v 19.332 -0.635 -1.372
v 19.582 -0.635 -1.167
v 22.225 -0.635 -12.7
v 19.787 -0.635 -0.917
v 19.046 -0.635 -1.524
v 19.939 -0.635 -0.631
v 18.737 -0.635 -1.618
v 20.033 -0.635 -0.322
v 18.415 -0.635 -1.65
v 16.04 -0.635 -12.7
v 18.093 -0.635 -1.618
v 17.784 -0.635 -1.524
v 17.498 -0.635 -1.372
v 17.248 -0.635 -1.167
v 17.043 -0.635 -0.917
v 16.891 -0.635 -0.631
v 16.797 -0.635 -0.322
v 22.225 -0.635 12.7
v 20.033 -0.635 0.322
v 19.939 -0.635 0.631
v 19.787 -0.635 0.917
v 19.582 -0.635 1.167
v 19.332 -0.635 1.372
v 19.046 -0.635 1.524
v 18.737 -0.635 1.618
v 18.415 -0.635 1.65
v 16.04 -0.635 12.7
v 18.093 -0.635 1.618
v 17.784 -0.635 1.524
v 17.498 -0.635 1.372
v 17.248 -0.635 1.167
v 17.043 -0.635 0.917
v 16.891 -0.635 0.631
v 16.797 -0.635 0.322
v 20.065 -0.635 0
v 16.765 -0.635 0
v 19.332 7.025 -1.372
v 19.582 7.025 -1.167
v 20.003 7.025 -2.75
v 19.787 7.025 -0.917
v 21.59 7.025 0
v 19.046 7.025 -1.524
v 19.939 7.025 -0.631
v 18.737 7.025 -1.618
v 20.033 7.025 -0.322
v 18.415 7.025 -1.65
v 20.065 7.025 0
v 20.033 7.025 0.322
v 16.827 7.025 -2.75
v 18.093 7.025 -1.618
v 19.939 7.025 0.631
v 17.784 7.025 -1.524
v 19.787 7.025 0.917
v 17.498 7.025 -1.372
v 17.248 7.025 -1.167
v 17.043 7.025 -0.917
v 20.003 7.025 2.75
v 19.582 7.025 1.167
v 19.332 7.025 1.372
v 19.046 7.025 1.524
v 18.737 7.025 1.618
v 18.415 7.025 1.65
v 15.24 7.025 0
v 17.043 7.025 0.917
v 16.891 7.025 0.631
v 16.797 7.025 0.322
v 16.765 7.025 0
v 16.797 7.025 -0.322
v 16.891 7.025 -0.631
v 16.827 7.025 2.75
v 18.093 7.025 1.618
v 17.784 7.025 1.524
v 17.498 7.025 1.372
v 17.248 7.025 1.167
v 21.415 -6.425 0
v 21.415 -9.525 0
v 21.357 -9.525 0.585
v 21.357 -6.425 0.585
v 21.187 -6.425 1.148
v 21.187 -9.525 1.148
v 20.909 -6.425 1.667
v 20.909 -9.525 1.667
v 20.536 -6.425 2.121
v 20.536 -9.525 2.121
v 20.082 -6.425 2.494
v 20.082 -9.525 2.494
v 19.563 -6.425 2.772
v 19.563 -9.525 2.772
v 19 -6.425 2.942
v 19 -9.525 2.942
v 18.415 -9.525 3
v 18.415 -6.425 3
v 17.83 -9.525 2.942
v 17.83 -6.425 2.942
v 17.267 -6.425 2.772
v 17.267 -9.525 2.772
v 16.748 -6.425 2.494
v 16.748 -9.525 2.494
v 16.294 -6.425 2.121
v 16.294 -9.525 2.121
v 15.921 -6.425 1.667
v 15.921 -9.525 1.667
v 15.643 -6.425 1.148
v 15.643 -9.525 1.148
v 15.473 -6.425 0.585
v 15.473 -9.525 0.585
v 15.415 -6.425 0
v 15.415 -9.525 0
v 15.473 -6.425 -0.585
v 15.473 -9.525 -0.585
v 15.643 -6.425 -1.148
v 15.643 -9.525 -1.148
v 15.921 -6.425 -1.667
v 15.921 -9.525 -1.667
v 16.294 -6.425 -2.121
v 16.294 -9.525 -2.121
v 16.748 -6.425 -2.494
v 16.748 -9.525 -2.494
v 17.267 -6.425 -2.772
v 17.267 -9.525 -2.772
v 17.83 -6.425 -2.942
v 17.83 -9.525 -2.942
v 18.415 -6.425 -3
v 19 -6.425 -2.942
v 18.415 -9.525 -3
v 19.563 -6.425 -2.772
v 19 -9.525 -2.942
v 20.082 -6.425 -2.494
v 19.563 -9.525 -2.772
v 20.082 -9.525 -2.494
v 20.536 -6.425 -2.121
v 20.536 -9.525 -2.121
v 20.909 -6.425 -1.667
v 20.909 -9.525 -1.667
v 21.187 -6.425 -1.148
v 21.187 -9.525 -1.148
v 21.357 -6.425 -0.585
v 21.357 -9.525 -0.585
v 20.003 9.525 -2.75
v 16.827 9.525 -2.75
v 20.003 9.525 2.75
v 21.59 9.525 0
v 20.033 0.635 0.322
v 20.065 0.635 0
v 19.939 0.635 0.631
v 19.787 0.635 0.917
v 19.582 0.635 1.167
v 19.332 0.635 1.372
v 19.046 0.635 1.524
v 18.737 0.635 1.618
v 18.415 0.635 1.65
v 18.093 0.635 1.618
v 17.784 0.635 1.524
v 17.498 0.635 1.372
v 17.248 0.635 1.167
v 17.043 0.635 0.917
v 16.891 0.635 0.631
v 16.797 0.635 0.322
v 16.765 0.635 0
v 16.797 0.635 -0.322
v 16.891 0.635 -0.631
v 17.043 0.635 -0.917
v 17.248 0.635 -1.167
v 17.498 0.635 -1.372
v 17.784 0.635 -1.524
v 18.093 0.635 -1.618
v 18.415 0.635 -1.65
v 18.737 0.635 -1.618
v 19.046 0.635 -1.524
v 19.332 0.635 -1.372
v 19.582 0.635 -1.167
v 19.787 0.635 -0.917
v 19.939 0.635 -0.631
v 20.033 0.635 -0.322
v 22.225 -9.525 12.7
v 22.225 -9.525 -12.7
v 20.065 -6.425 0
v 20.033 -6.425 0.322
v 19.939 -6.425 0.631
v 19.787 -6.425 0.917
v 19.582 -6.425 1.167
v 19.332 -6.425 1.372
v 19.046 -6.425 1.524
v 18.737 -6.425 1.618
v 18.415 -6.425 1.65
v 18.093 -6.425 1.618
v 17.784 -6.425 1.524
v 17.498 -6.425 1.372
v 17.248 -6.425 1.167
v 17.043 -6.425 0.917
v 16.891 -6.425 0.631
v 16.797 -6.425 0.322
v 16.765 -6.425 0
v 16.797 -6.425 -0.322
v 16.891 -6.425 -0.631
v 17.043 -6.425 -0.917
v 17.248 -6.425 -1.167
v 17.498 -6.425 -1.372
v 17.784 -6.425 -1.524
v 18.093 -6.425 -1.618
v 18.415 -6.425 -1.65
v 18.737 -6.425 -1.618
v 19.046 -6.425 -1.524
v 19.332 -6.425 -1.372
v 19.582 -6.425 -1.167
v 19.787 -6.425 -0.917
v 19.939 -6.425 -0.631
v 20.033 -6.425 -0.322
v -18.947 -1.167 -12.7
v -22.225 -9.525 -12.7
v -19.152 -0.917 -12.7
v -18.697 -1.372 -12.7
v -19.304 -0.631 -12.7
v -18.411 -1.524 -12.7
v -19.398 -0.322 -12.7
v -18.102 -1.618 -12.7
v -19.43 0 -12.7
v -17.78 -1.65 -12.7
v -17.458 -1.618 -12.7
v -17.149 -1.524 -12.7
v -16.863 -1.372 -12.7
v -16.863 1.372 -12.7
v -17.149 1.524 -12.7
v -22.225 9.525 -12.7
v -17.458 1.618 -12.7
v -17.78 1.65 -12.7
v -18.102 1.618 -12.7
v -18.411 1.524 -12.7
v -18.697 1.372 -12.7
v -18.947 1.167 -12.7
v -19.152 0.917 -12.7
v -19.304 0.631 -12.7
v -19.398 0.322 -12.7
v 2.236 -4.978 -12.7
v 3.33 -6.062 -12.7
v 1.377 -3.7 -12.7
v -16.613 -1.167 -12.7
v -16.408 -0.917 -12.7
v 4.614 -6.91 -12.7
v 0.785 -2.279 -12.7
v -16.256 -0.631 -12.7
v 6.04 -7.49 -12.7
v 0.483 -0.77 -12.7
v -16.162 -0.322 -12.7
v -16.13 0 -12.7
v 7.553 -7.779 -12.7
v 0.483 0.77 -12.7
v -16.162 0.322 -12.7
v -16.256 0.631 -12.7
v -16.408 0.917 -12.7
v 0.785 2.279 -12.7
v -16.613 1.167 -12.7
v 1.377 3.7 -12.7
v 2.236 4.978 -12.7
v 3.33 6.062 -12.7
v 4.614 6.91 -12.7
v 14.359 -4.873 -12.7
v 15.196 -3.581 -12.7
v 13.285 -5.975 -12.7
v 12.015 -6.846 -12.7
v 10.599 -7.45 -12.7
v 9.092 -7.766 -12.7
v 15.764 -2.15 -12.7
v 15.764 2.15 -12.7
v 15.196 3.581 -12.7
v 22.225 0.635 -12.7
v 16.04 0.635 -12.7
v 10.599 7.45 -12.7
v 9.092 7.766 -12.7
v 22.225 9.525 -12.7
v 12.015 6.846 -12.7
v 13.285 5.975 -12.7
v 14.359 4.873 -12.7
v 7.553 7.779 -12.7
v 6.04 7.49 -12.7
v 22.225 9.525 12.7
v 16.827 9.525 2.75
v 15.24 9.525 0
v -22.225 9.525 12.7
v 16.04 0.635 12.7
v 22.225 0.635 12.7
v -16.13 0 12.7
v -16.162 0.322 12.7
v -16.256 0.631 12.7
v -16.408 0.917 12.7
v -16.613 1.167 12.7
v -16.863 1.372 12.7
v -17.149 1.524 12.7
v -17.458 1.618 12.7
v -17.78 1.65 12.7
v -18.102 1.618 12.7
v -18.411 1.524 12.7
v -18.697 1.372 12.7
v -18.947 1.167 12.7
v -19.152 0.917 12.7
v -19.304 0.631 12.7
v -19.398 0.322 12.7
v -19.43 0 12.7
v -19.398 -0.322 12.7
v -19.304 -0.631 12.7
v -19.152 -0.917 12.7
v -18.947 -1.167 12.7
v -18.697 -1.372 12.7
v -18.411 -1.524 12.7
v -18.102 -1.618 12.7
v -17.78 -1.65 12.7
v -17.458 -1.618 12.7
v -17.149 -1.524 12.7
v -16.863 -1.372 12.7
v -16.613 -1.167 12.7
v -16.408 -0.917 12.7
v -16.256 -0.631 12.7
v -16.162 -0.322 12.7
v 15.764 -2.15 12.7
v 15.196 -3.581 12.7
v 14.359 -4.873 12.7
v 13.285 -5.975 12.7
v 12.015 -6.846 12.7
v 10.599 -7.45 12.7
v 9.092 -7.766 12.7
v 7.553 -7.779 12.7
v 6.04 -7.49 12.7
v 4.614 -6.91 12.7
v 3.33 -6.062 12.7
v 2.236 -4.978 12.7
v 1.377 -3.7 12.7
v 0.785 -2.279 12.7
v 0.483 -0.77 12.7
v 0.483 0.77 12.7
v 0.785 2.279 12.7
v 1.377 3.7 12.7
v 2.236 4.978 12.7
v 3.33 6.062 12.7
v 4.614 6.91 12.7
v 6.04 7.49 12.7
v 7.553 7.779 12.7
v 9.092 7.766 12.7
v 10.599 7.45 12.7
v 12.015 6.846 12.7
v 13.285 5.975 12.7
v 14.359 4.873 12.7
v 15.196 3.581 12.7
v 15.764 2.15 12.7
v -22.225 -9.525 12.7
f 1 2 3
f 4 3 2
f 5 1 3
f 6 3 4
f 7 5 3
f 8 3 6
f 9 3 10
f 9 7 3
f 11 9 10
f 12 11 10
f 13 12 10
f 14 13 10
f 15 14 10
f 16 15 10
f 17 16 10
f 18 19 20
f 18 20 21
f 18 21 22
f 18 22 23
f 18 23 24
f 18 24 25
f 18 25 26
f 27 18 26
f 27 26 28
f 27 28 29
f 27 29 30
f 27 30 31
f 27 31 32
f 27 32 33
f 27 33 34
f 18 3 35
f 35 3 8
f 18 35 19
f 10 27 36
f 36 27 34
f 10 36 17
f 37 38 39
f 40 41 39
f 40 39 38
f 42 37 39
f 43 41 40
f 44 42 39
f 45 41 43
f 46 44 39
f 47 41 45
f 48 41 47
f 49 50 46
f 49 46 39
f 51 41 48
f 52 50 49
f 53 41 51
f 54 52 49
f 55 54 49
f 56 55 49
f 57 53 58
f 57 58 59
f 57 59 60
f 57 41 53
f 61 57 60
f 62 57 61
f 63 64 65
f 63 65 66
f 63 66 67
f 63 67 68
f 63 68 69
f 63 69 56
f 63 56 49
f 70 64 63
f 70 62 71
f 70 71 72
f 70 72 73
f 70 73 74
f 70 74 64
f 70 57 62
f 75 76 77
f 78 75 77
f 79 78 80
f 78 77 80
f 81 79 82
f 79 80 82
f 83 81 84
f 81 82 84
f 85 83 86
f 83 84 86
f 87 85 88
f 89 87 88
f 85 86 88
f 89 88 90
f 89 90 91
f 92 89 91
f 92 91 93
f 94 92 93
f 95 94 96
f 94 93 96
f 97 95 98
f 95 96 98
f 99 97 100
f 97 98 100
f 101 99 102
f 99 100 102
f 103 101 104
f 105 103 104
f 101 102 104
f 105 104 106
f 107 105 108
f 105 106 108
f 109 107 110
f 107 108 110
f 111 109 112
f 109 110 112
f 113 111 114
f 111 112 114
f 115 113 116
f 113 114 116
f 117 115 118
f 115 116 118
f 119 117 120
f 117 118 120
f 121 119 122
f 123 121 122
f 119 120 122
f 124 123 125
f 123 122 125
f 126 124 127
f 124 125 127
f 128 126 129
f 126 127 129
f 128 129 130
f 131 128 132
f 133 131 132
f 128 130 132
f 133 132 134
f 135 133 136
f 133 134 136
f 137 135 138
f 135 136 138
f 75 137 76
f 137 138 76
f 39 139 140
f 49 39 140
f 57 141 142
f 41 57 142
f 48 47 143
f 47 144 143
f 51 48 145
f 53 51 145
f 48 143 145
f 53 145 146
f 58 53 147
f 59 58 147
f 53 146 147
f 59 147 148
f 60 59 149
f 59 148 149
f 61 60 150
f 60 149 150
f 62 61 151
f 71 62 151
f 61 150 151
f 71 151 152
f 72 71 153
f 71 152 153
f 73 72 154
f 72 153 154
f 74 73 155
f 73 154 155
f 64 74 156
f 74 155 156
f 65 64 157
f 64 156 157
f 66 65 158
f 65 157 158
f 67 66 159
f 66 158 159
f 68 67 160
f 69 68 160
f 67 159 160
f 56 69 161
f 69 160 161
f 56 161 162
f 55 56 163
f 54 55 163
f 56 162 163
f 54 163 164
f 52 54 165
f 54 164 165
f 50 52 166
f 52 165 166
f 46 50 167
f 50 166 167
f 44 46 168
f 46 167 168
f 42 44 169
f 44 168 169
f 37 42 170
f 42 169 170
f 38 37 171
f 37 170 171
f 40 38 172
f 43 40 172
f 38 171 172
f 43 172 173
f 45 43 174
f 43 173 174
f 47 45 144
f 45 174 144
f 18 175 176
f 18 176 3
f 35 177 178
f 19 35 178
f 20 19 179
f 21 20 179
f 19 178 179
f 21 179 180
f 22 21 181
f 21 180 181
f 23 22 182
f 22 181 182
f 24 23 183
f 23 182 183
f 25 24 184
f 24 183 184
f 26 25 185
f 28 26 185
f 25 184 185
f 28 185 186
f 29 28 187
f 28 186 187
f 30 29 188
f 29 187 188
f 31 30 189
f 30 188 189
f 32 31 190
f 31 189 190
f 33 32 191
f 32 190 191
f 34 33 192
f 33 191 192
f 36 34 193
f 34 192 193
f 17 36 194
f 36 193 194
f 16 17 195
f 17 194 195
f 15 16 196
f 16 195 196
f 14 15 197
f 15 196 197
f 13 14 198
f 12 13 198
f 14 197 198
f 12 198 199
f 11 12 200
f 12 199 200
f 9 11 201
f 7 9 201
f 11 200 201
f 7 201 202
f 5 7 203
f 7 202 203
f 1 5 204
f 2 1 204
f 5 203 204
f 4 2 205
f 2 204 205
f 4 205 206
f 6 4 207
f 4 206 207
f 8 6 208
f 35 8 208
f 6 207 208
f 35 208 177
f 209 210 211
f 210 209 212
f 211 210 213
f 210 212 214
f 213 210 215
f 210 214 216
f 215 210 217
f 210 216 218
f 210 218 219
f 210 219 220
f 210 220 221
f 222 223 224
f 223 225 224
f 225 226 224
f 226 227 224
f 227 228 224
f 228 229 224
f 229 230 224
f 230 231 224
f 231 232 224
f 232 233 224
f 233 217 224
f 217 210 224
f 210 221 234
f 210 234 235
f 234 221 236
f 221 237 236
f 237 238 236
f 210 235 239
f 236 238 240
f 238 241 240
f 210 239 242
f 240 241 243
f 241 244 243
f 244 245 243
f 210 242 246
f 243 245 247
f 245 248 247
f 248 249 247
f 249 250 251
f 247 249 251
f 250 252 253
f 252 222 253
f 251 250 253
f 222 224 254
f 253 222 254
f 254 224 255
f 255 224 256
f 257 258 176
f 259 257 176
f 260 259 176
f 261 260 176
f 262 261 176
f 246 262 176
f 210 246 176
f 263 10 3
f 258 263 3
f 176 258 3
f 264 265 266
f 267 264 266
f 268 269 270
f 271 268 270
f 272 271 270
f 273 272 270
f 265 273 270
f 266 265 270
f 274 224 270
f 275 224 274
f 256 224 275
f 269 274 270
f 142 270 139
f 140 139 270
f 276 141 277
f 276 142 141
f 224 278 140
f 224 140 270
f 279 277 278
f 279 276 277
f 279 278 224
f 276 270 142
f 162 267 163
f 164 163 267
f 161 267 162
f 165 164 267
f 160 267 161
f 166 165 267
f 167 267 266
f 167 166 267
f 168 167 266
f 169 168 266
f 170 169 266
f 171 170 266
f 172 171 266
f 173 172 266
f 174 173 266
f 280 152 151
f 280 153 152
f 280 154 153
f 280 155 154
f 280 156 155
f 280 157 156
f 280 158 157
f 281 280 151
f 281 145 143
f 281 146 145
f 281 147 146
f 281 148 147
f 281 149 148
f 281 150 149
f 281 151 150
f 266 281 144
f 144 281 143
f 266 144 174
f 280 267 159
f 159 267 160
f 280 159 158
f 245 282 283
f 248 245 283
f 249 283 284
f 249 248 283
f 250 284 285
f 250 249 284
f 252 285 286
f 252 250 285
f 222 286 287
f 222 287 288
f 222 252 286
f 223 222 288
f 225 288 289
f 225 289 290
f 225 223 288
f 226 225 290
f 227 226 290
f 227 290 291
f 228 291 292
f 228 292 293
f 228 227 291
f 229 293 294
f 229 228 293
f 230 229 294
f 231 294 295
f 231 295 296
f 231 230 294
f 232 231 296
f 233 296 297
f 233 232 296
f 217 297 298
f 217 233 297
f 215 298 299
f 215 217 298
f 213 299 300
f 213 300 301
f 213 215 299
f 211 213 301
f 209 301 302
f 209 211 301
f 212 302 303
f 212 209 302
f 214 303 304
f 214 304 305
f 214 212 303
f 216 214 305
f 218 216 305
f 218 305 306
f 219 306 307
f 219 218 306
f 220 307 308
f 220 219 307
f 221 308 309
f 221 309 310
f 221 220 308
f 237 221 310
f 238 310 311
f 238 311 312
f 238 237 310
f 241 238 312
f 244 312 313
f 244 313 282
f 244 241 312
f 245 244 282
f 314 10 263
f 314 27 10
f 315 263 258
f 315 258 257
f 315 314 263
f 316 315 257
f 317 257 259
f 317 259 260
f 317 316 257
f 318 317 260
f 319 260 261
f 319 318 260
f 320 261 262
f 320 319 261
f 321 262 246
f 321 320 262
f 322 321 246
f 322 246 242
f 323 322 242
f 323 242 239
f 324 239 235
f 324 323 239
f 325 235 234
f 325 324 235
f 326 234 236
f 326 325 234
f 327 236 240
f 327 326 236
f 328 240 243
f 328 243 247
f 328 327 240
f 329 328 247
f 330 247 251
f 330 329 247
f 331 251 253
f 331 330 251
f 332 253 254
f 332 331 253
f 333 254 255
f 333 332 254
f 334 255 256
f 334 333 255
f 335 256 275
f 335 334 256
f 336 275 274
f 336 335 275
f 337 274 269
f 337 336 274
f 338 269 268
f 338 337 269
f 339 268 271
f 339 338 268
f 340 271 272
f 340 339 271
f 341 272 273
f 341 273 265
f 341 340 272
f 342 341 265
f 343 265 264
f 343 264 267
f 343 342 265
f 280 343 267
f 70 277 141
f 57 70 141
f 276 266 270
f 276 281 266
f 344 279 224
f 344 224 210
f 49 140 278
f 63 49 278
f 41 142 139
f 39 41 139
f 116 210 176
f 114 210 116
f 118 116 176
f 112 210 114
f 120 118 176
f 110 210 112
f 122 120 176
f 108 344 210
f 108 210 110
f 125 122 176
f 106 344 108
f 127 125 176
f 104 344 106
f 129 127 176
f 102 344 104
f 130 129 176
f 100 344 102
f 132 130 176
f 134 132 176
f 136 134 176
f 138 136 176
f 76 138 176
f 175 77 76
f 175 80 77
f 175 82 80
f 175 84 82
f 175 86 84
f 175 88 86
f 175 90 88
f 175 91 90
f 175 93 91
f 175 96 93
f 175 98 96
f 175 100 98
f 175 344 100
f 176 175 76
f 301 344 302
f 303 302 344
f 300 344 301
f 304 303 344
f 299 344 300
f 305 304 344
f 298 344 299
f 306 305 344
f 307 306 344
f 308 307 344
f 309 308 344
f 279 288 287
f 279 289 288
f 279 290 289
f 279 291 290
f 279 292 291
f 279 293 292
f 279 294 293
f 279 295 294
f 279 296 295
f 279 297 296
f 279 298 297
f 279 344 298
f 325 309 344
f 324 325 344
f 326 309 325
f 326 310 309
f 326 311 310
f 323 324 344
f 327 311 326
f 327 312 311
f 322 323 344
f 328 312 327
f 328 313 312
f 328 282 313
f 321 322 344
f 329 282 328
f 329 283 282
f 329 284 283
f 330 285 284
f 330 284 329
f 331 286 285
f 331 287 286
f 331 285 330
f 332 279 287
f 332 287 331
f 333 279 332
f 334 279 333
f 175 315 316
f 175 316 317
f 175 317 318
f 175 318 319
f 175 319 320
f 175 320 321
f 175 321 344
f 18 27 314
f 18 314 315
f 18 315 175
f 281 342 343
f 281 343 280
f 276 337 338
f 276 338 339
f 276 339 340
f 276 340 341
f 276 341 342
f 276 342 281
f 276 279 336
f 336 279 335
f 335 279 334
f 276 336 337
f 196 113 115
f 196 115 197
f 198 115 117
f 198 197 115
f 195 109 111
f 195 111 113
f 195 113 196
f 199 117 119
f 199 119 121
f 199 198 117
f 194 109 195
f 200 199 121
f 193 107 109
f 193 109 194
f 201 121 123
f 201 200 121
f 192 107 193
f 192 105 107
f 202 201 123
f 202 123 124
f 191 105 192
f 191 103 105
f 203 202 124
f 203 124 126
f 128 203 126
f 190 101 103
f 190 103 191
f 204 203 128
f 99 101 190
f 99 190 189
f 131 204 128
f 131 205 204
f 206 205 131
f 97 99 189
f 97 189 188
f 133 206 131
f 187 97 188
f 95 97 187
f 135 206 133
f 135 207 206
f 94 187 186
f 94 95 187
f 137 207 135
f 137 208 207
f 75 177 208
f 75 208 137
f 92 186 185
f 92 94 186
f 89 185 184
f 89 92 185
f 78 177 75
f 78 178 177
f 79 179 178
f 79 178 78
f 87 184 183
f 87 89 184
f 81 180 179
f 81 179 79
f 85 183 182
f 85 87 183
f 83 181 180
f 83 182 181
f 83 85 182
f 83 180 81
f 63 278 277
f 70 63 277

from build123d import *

# Parameters (mm, degrees)
F0_R     = 1.65
F1_DEPTH = 12.7
F2_R     = 1.65
F3_DEPTH = 25.4
F4_R     = 3
F4_R_2   = 1.65
F5_DEPTH = 3.1
F6_R     = 1.65
F7_DEPTH = 2.5


with BuildPart() as f1:
    # F0 (on Top) → F1 (new body, symmetric)
    with BuildSketch(Plane.XY):
        with BuildLine():
            Line((22.225, 9.525), (-22.225, 9.525))
            Line((-22.225, 9.525), (-22.225, -9.525))
            Line((-22.225, -9.525), (22.225, -9.525))
            Line((22.225, -9.525), (22.225, -0.635))
            Line((22.225, -0.635), (16.039644, -0.635))
            ThreePointArc((16.039644, -0.635), (0.4445, 0), (16.039644, 0.635))
            Line((16.039644, 0.635), (22.225, 0.635))
            Line((22.225, 0.635), (22.225, 9.525))
        make_face()
        with Locations((-17.78, 0)):
            Circle(F0_R, mode=Mode.SUBTRACT)
    extrude(amount=F1_DEPTH, both=True)

    # F2 (on Front) → F3 (cut, symmetric)
    with BuildSketch(Plane.XZ):
        with Locations((18.415, 0)):
            Circle(F2_R)
    extrude(amount=F3_DEPTH, both=True, mode=Mode.SUBTRACT)

    # F4 (on face) → F5 (cut)
    with BuildSketch(Plane.XZ.offset(9.525)):
        with Locations((18.415, 0)):
            Circle(F4_R)
        with Locations((18.415, 0)):
            Circle(F4_R_2, mode=Mode.SUBTRACT)
    extrude(amount=-F5_DEPTH, mode=Mode.SUBTRACT)

    # F6 (on face) → F7 (cut)
    with BuildSketch(Plane(origin=(0, 9.525, 0), x_dir=(-1, 0, 0), z_dir=(0, 1, 0))):
        Polygon((-16.827287, 2.75), (-20.002713, 2.75), (-21.590426, 0), (-20.002713, -2.75), (-16.827287, -2.75), (-15.239574, 0), align=None)
        with Locations((-18.415, 0)):
            Circle(F6_R, mode=Mode.SUBTRACT)
    extrude(amount=-F7_DEPTH, mode=Mode.SUBTRACT)


solid = f1.part
